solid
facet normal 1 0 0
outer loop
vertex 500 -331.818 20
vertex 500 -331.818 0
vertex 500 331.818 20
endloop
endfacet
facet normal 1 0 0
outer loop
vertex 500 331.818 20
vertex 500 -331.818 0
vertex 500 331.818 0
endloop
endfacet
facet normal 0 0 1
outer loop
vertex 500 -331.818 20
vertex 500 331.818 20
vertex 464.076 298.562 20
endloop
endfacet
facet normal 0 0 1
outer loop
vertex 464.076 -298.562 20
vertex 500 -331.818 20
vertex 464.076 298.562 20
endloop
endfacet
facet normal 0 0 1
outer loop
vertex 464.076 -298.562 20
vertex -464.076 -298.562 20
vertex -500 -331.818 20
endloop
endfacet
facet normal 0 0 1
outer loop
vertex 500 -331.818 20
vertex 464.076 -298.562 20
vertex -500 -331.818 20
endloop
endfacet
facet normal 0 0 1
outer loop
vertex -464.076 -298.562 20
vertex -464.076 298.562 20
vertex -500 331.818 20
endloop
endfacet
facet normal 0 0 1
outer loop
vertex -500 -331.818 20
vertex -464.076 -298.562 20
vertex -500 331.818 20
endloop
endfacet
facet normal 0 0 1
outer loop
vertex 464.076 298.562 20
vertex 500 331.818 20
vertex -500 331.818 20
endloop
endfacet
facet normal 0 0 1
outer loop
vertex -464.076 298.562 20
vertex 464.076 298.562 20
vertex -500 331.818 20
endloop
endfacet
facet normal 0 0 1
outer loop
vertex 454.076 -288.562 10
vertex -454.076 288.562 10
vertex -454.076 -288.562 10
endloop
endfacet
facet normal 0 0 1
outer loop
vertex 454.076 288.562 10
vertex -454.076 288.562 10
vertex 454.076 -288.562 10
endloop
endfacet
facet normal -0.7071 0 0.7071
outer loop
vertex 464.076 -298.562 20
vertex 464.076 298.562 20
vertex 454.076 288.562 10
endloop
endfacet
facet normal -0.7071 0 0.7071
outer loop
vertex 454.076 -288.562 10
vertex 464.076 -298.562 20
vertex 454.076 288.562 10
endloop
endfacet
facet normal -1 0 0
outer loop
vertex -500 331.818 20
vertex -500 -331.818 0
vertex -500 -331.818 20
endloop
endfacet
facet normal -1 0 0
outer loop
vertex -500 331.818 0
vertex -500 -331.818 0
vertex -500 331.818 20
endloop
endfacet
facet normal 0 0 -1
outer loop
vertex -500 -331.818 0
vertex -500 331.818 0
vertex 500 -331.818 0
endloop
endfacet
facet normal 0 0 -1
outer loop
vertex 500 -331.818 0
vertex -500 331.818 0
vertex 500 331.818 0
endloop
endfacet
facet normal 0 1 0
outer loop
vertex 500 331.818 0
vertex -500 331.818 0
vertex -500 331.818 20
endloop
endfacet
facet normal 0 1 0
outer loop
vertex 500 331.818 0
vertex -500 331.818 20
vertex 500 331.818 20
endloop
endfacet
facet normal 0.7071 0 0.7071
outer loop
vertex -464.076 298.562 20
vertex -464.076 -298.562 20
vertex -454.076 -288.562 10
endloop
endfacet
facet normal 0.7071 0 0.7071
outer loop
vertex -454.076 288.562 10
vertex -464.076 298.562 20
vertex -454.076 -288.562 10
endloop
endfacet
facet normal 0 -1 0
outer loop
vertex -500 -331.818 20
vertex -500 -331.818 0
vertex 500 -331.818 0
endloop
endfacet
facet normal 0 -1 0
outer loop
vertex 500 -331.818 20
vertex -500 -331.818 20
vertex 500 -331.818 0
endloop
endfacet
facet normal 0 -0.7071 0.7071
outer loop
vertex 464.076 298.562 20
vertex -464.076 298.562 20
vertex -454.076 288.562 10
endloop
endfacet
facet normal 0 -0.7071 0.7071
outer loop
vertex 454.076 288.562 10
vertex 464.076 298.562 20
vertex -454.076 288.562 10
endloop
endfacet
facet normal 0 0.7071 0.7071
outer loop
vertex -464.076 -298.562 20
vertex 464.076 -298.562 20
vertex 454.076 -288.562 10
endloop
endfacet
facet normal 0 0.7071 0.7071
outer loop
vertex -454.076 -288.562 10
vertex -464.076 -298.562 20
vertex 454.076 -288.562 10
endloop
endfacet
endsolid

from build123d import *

# Parameters (mm, degrees)
SKETCH2_W           = 1000
SKETCH2_H           = 663.636363636
BOSS_EXTRUDE1_DEPTH = 20
SKETCH3_W           = 948.152188742
SKETCH3_H           = 617.123435666
CUT_EXTRUDE1_DEPTH  = 10
CHAMFER1_SIZE       = 20


with BuildPart() as part:
    # Sketch2 → Boss-Extrude1 (new body)
    with BuildSketch(Plane.XY):
        Rectangle(SKETCH2_W, SKETCH2_H)
    extrude(amount=BOSS_EXTRUDE1_DEPTH)

    # Sketch3 → Cut-Extrude1 (cut)
    with BuildSketch(Plane.XY.offset(20)):
        Rectangle(SKETCH3_W, SKETCH3_H)
    extrude(amount=-CUT_EXTRUDE1_DEPTH, mode=Mode.SUBTRACT)

    # Chamfer1
    # the kernel refuses this chamfer: 20 mm, written as the material it adds along each edge
    with BuildSketch(Plane(origin=(-474.076094371, -308.561717833, 10), x_dir=(0, -0.0274958766105877, 0.9996219169112968), z_dir=(1, 0, 0))) as chamfer1_piece_1_section:
        Polygon((CHAMFER1_SIZE * 0.999621916911, -CHAMFER1_SIZE * 0.0274958766106), (-CHAMFER1_SIZE * 0.0274958766106, -CHAMFER1_SIZE * 0.999621916911), (0, 0), align=None)
    chamfer1_piece_1 = extrude(amount=948.152188741, mode=Mode.PRIVATE)
    chamfer1_piece_1 = split(chamfer1_piece_1, bisect_by=Plane(origin=(0, -300.783940055, 20), z_dir=(0, 0, -1)), keep=Keep.TOP, mode=Mode.PRIVATE)
    add(chamfer1_piece_1)
    with BuildSketch(Plane(origin=(-474.076094371, 308.561717833, 10), x_dir=(-0.0274958766105877, 0, 0.9996219169112968), z_dir=(0, -1, 0))) as chamfer1_piece_2_section:
        Polygon((CHAMFER1_SIZE * 0.999621916911, -CHAMFER1_SIZE * 0.0274958766106), (-CHAMFER1_SIZE * 0.0274958766106, -CHAMFER1_SIZE * 0.999621916911), (0, 0), align=None)
    chamfer1_piece_2 = extrude(amount=617.123435666, mode=Mode.PRIVATE)
    chamfer1_piece_2 = split(chamfer1_piece_2, bisect_by=Plane(origin=(-466.298316593, 0, 20), z_dir=(0, 0, -1)), keep=Keep.TOP, mode=Mode.PRIVATE)
    add(chamfer1_piece_2)
    with BuildSketch(Plane(origin=(474.076094371, 308.561717833, 10), x_dir=(0, 0.0274958766105877, 0.9996219169112968), z_dir=(-1, 0, 0))) as chamfer1_piece_3_section:
        Polygon((CHAMFER1_SIZE * 0.999621916911, -CHAMFER1_SIZE * 0.0274958766106), (-CHAMFER1_SIZE * 0.0274958766106, -CHAMFER1_SIZE * 0.999621916911), (0, 0), align=None)
    chamfer1_piece_3 = extrude(amount=948.152188741, mode=Mode.PRIVATE)
    chamfer1_piece_3 = split(chamfer1_piece_3, bisect_by=Plane(origin=(0, 300.783940055, 20), z_dir=(0, 0, -1)), keep=Keep.TOP, mode=Mode.PRIVATE)
    add(chamfer1_piece_3)
    with BuildSketch(Plane(origin=(474.076094371, -308.561717833, 10), x_dir=(0.0274958766105877, 0, 0.9996219169112968), z_dir=(0, 1, 0))) as chamfer1_piece_4_section:
        Polygon((CHAMFER1_SIZE * 0.999621916911, -CHAMFER1_SIZE * 0.0274958766106), (-CHAMFER1_SIZE * 0.0274958766106, -CHAMFER1_SIZE * 0.999621916911), (0, 0), align=None)
    chamfer1_piece_4 = extrude(amount=617.123435666, mode=Mode.PRIVATE)
    chamfer1_piece_4 = split(chamfer1_piece_4, bisect_by=Plane(origin=(466.298316593, 0, 20), z_dir=(0, 0, -1)), keep=Keep.TOP, mode=Mode.PRIVATE)
    add(chamfer1_piece_4)


solid = part.part
